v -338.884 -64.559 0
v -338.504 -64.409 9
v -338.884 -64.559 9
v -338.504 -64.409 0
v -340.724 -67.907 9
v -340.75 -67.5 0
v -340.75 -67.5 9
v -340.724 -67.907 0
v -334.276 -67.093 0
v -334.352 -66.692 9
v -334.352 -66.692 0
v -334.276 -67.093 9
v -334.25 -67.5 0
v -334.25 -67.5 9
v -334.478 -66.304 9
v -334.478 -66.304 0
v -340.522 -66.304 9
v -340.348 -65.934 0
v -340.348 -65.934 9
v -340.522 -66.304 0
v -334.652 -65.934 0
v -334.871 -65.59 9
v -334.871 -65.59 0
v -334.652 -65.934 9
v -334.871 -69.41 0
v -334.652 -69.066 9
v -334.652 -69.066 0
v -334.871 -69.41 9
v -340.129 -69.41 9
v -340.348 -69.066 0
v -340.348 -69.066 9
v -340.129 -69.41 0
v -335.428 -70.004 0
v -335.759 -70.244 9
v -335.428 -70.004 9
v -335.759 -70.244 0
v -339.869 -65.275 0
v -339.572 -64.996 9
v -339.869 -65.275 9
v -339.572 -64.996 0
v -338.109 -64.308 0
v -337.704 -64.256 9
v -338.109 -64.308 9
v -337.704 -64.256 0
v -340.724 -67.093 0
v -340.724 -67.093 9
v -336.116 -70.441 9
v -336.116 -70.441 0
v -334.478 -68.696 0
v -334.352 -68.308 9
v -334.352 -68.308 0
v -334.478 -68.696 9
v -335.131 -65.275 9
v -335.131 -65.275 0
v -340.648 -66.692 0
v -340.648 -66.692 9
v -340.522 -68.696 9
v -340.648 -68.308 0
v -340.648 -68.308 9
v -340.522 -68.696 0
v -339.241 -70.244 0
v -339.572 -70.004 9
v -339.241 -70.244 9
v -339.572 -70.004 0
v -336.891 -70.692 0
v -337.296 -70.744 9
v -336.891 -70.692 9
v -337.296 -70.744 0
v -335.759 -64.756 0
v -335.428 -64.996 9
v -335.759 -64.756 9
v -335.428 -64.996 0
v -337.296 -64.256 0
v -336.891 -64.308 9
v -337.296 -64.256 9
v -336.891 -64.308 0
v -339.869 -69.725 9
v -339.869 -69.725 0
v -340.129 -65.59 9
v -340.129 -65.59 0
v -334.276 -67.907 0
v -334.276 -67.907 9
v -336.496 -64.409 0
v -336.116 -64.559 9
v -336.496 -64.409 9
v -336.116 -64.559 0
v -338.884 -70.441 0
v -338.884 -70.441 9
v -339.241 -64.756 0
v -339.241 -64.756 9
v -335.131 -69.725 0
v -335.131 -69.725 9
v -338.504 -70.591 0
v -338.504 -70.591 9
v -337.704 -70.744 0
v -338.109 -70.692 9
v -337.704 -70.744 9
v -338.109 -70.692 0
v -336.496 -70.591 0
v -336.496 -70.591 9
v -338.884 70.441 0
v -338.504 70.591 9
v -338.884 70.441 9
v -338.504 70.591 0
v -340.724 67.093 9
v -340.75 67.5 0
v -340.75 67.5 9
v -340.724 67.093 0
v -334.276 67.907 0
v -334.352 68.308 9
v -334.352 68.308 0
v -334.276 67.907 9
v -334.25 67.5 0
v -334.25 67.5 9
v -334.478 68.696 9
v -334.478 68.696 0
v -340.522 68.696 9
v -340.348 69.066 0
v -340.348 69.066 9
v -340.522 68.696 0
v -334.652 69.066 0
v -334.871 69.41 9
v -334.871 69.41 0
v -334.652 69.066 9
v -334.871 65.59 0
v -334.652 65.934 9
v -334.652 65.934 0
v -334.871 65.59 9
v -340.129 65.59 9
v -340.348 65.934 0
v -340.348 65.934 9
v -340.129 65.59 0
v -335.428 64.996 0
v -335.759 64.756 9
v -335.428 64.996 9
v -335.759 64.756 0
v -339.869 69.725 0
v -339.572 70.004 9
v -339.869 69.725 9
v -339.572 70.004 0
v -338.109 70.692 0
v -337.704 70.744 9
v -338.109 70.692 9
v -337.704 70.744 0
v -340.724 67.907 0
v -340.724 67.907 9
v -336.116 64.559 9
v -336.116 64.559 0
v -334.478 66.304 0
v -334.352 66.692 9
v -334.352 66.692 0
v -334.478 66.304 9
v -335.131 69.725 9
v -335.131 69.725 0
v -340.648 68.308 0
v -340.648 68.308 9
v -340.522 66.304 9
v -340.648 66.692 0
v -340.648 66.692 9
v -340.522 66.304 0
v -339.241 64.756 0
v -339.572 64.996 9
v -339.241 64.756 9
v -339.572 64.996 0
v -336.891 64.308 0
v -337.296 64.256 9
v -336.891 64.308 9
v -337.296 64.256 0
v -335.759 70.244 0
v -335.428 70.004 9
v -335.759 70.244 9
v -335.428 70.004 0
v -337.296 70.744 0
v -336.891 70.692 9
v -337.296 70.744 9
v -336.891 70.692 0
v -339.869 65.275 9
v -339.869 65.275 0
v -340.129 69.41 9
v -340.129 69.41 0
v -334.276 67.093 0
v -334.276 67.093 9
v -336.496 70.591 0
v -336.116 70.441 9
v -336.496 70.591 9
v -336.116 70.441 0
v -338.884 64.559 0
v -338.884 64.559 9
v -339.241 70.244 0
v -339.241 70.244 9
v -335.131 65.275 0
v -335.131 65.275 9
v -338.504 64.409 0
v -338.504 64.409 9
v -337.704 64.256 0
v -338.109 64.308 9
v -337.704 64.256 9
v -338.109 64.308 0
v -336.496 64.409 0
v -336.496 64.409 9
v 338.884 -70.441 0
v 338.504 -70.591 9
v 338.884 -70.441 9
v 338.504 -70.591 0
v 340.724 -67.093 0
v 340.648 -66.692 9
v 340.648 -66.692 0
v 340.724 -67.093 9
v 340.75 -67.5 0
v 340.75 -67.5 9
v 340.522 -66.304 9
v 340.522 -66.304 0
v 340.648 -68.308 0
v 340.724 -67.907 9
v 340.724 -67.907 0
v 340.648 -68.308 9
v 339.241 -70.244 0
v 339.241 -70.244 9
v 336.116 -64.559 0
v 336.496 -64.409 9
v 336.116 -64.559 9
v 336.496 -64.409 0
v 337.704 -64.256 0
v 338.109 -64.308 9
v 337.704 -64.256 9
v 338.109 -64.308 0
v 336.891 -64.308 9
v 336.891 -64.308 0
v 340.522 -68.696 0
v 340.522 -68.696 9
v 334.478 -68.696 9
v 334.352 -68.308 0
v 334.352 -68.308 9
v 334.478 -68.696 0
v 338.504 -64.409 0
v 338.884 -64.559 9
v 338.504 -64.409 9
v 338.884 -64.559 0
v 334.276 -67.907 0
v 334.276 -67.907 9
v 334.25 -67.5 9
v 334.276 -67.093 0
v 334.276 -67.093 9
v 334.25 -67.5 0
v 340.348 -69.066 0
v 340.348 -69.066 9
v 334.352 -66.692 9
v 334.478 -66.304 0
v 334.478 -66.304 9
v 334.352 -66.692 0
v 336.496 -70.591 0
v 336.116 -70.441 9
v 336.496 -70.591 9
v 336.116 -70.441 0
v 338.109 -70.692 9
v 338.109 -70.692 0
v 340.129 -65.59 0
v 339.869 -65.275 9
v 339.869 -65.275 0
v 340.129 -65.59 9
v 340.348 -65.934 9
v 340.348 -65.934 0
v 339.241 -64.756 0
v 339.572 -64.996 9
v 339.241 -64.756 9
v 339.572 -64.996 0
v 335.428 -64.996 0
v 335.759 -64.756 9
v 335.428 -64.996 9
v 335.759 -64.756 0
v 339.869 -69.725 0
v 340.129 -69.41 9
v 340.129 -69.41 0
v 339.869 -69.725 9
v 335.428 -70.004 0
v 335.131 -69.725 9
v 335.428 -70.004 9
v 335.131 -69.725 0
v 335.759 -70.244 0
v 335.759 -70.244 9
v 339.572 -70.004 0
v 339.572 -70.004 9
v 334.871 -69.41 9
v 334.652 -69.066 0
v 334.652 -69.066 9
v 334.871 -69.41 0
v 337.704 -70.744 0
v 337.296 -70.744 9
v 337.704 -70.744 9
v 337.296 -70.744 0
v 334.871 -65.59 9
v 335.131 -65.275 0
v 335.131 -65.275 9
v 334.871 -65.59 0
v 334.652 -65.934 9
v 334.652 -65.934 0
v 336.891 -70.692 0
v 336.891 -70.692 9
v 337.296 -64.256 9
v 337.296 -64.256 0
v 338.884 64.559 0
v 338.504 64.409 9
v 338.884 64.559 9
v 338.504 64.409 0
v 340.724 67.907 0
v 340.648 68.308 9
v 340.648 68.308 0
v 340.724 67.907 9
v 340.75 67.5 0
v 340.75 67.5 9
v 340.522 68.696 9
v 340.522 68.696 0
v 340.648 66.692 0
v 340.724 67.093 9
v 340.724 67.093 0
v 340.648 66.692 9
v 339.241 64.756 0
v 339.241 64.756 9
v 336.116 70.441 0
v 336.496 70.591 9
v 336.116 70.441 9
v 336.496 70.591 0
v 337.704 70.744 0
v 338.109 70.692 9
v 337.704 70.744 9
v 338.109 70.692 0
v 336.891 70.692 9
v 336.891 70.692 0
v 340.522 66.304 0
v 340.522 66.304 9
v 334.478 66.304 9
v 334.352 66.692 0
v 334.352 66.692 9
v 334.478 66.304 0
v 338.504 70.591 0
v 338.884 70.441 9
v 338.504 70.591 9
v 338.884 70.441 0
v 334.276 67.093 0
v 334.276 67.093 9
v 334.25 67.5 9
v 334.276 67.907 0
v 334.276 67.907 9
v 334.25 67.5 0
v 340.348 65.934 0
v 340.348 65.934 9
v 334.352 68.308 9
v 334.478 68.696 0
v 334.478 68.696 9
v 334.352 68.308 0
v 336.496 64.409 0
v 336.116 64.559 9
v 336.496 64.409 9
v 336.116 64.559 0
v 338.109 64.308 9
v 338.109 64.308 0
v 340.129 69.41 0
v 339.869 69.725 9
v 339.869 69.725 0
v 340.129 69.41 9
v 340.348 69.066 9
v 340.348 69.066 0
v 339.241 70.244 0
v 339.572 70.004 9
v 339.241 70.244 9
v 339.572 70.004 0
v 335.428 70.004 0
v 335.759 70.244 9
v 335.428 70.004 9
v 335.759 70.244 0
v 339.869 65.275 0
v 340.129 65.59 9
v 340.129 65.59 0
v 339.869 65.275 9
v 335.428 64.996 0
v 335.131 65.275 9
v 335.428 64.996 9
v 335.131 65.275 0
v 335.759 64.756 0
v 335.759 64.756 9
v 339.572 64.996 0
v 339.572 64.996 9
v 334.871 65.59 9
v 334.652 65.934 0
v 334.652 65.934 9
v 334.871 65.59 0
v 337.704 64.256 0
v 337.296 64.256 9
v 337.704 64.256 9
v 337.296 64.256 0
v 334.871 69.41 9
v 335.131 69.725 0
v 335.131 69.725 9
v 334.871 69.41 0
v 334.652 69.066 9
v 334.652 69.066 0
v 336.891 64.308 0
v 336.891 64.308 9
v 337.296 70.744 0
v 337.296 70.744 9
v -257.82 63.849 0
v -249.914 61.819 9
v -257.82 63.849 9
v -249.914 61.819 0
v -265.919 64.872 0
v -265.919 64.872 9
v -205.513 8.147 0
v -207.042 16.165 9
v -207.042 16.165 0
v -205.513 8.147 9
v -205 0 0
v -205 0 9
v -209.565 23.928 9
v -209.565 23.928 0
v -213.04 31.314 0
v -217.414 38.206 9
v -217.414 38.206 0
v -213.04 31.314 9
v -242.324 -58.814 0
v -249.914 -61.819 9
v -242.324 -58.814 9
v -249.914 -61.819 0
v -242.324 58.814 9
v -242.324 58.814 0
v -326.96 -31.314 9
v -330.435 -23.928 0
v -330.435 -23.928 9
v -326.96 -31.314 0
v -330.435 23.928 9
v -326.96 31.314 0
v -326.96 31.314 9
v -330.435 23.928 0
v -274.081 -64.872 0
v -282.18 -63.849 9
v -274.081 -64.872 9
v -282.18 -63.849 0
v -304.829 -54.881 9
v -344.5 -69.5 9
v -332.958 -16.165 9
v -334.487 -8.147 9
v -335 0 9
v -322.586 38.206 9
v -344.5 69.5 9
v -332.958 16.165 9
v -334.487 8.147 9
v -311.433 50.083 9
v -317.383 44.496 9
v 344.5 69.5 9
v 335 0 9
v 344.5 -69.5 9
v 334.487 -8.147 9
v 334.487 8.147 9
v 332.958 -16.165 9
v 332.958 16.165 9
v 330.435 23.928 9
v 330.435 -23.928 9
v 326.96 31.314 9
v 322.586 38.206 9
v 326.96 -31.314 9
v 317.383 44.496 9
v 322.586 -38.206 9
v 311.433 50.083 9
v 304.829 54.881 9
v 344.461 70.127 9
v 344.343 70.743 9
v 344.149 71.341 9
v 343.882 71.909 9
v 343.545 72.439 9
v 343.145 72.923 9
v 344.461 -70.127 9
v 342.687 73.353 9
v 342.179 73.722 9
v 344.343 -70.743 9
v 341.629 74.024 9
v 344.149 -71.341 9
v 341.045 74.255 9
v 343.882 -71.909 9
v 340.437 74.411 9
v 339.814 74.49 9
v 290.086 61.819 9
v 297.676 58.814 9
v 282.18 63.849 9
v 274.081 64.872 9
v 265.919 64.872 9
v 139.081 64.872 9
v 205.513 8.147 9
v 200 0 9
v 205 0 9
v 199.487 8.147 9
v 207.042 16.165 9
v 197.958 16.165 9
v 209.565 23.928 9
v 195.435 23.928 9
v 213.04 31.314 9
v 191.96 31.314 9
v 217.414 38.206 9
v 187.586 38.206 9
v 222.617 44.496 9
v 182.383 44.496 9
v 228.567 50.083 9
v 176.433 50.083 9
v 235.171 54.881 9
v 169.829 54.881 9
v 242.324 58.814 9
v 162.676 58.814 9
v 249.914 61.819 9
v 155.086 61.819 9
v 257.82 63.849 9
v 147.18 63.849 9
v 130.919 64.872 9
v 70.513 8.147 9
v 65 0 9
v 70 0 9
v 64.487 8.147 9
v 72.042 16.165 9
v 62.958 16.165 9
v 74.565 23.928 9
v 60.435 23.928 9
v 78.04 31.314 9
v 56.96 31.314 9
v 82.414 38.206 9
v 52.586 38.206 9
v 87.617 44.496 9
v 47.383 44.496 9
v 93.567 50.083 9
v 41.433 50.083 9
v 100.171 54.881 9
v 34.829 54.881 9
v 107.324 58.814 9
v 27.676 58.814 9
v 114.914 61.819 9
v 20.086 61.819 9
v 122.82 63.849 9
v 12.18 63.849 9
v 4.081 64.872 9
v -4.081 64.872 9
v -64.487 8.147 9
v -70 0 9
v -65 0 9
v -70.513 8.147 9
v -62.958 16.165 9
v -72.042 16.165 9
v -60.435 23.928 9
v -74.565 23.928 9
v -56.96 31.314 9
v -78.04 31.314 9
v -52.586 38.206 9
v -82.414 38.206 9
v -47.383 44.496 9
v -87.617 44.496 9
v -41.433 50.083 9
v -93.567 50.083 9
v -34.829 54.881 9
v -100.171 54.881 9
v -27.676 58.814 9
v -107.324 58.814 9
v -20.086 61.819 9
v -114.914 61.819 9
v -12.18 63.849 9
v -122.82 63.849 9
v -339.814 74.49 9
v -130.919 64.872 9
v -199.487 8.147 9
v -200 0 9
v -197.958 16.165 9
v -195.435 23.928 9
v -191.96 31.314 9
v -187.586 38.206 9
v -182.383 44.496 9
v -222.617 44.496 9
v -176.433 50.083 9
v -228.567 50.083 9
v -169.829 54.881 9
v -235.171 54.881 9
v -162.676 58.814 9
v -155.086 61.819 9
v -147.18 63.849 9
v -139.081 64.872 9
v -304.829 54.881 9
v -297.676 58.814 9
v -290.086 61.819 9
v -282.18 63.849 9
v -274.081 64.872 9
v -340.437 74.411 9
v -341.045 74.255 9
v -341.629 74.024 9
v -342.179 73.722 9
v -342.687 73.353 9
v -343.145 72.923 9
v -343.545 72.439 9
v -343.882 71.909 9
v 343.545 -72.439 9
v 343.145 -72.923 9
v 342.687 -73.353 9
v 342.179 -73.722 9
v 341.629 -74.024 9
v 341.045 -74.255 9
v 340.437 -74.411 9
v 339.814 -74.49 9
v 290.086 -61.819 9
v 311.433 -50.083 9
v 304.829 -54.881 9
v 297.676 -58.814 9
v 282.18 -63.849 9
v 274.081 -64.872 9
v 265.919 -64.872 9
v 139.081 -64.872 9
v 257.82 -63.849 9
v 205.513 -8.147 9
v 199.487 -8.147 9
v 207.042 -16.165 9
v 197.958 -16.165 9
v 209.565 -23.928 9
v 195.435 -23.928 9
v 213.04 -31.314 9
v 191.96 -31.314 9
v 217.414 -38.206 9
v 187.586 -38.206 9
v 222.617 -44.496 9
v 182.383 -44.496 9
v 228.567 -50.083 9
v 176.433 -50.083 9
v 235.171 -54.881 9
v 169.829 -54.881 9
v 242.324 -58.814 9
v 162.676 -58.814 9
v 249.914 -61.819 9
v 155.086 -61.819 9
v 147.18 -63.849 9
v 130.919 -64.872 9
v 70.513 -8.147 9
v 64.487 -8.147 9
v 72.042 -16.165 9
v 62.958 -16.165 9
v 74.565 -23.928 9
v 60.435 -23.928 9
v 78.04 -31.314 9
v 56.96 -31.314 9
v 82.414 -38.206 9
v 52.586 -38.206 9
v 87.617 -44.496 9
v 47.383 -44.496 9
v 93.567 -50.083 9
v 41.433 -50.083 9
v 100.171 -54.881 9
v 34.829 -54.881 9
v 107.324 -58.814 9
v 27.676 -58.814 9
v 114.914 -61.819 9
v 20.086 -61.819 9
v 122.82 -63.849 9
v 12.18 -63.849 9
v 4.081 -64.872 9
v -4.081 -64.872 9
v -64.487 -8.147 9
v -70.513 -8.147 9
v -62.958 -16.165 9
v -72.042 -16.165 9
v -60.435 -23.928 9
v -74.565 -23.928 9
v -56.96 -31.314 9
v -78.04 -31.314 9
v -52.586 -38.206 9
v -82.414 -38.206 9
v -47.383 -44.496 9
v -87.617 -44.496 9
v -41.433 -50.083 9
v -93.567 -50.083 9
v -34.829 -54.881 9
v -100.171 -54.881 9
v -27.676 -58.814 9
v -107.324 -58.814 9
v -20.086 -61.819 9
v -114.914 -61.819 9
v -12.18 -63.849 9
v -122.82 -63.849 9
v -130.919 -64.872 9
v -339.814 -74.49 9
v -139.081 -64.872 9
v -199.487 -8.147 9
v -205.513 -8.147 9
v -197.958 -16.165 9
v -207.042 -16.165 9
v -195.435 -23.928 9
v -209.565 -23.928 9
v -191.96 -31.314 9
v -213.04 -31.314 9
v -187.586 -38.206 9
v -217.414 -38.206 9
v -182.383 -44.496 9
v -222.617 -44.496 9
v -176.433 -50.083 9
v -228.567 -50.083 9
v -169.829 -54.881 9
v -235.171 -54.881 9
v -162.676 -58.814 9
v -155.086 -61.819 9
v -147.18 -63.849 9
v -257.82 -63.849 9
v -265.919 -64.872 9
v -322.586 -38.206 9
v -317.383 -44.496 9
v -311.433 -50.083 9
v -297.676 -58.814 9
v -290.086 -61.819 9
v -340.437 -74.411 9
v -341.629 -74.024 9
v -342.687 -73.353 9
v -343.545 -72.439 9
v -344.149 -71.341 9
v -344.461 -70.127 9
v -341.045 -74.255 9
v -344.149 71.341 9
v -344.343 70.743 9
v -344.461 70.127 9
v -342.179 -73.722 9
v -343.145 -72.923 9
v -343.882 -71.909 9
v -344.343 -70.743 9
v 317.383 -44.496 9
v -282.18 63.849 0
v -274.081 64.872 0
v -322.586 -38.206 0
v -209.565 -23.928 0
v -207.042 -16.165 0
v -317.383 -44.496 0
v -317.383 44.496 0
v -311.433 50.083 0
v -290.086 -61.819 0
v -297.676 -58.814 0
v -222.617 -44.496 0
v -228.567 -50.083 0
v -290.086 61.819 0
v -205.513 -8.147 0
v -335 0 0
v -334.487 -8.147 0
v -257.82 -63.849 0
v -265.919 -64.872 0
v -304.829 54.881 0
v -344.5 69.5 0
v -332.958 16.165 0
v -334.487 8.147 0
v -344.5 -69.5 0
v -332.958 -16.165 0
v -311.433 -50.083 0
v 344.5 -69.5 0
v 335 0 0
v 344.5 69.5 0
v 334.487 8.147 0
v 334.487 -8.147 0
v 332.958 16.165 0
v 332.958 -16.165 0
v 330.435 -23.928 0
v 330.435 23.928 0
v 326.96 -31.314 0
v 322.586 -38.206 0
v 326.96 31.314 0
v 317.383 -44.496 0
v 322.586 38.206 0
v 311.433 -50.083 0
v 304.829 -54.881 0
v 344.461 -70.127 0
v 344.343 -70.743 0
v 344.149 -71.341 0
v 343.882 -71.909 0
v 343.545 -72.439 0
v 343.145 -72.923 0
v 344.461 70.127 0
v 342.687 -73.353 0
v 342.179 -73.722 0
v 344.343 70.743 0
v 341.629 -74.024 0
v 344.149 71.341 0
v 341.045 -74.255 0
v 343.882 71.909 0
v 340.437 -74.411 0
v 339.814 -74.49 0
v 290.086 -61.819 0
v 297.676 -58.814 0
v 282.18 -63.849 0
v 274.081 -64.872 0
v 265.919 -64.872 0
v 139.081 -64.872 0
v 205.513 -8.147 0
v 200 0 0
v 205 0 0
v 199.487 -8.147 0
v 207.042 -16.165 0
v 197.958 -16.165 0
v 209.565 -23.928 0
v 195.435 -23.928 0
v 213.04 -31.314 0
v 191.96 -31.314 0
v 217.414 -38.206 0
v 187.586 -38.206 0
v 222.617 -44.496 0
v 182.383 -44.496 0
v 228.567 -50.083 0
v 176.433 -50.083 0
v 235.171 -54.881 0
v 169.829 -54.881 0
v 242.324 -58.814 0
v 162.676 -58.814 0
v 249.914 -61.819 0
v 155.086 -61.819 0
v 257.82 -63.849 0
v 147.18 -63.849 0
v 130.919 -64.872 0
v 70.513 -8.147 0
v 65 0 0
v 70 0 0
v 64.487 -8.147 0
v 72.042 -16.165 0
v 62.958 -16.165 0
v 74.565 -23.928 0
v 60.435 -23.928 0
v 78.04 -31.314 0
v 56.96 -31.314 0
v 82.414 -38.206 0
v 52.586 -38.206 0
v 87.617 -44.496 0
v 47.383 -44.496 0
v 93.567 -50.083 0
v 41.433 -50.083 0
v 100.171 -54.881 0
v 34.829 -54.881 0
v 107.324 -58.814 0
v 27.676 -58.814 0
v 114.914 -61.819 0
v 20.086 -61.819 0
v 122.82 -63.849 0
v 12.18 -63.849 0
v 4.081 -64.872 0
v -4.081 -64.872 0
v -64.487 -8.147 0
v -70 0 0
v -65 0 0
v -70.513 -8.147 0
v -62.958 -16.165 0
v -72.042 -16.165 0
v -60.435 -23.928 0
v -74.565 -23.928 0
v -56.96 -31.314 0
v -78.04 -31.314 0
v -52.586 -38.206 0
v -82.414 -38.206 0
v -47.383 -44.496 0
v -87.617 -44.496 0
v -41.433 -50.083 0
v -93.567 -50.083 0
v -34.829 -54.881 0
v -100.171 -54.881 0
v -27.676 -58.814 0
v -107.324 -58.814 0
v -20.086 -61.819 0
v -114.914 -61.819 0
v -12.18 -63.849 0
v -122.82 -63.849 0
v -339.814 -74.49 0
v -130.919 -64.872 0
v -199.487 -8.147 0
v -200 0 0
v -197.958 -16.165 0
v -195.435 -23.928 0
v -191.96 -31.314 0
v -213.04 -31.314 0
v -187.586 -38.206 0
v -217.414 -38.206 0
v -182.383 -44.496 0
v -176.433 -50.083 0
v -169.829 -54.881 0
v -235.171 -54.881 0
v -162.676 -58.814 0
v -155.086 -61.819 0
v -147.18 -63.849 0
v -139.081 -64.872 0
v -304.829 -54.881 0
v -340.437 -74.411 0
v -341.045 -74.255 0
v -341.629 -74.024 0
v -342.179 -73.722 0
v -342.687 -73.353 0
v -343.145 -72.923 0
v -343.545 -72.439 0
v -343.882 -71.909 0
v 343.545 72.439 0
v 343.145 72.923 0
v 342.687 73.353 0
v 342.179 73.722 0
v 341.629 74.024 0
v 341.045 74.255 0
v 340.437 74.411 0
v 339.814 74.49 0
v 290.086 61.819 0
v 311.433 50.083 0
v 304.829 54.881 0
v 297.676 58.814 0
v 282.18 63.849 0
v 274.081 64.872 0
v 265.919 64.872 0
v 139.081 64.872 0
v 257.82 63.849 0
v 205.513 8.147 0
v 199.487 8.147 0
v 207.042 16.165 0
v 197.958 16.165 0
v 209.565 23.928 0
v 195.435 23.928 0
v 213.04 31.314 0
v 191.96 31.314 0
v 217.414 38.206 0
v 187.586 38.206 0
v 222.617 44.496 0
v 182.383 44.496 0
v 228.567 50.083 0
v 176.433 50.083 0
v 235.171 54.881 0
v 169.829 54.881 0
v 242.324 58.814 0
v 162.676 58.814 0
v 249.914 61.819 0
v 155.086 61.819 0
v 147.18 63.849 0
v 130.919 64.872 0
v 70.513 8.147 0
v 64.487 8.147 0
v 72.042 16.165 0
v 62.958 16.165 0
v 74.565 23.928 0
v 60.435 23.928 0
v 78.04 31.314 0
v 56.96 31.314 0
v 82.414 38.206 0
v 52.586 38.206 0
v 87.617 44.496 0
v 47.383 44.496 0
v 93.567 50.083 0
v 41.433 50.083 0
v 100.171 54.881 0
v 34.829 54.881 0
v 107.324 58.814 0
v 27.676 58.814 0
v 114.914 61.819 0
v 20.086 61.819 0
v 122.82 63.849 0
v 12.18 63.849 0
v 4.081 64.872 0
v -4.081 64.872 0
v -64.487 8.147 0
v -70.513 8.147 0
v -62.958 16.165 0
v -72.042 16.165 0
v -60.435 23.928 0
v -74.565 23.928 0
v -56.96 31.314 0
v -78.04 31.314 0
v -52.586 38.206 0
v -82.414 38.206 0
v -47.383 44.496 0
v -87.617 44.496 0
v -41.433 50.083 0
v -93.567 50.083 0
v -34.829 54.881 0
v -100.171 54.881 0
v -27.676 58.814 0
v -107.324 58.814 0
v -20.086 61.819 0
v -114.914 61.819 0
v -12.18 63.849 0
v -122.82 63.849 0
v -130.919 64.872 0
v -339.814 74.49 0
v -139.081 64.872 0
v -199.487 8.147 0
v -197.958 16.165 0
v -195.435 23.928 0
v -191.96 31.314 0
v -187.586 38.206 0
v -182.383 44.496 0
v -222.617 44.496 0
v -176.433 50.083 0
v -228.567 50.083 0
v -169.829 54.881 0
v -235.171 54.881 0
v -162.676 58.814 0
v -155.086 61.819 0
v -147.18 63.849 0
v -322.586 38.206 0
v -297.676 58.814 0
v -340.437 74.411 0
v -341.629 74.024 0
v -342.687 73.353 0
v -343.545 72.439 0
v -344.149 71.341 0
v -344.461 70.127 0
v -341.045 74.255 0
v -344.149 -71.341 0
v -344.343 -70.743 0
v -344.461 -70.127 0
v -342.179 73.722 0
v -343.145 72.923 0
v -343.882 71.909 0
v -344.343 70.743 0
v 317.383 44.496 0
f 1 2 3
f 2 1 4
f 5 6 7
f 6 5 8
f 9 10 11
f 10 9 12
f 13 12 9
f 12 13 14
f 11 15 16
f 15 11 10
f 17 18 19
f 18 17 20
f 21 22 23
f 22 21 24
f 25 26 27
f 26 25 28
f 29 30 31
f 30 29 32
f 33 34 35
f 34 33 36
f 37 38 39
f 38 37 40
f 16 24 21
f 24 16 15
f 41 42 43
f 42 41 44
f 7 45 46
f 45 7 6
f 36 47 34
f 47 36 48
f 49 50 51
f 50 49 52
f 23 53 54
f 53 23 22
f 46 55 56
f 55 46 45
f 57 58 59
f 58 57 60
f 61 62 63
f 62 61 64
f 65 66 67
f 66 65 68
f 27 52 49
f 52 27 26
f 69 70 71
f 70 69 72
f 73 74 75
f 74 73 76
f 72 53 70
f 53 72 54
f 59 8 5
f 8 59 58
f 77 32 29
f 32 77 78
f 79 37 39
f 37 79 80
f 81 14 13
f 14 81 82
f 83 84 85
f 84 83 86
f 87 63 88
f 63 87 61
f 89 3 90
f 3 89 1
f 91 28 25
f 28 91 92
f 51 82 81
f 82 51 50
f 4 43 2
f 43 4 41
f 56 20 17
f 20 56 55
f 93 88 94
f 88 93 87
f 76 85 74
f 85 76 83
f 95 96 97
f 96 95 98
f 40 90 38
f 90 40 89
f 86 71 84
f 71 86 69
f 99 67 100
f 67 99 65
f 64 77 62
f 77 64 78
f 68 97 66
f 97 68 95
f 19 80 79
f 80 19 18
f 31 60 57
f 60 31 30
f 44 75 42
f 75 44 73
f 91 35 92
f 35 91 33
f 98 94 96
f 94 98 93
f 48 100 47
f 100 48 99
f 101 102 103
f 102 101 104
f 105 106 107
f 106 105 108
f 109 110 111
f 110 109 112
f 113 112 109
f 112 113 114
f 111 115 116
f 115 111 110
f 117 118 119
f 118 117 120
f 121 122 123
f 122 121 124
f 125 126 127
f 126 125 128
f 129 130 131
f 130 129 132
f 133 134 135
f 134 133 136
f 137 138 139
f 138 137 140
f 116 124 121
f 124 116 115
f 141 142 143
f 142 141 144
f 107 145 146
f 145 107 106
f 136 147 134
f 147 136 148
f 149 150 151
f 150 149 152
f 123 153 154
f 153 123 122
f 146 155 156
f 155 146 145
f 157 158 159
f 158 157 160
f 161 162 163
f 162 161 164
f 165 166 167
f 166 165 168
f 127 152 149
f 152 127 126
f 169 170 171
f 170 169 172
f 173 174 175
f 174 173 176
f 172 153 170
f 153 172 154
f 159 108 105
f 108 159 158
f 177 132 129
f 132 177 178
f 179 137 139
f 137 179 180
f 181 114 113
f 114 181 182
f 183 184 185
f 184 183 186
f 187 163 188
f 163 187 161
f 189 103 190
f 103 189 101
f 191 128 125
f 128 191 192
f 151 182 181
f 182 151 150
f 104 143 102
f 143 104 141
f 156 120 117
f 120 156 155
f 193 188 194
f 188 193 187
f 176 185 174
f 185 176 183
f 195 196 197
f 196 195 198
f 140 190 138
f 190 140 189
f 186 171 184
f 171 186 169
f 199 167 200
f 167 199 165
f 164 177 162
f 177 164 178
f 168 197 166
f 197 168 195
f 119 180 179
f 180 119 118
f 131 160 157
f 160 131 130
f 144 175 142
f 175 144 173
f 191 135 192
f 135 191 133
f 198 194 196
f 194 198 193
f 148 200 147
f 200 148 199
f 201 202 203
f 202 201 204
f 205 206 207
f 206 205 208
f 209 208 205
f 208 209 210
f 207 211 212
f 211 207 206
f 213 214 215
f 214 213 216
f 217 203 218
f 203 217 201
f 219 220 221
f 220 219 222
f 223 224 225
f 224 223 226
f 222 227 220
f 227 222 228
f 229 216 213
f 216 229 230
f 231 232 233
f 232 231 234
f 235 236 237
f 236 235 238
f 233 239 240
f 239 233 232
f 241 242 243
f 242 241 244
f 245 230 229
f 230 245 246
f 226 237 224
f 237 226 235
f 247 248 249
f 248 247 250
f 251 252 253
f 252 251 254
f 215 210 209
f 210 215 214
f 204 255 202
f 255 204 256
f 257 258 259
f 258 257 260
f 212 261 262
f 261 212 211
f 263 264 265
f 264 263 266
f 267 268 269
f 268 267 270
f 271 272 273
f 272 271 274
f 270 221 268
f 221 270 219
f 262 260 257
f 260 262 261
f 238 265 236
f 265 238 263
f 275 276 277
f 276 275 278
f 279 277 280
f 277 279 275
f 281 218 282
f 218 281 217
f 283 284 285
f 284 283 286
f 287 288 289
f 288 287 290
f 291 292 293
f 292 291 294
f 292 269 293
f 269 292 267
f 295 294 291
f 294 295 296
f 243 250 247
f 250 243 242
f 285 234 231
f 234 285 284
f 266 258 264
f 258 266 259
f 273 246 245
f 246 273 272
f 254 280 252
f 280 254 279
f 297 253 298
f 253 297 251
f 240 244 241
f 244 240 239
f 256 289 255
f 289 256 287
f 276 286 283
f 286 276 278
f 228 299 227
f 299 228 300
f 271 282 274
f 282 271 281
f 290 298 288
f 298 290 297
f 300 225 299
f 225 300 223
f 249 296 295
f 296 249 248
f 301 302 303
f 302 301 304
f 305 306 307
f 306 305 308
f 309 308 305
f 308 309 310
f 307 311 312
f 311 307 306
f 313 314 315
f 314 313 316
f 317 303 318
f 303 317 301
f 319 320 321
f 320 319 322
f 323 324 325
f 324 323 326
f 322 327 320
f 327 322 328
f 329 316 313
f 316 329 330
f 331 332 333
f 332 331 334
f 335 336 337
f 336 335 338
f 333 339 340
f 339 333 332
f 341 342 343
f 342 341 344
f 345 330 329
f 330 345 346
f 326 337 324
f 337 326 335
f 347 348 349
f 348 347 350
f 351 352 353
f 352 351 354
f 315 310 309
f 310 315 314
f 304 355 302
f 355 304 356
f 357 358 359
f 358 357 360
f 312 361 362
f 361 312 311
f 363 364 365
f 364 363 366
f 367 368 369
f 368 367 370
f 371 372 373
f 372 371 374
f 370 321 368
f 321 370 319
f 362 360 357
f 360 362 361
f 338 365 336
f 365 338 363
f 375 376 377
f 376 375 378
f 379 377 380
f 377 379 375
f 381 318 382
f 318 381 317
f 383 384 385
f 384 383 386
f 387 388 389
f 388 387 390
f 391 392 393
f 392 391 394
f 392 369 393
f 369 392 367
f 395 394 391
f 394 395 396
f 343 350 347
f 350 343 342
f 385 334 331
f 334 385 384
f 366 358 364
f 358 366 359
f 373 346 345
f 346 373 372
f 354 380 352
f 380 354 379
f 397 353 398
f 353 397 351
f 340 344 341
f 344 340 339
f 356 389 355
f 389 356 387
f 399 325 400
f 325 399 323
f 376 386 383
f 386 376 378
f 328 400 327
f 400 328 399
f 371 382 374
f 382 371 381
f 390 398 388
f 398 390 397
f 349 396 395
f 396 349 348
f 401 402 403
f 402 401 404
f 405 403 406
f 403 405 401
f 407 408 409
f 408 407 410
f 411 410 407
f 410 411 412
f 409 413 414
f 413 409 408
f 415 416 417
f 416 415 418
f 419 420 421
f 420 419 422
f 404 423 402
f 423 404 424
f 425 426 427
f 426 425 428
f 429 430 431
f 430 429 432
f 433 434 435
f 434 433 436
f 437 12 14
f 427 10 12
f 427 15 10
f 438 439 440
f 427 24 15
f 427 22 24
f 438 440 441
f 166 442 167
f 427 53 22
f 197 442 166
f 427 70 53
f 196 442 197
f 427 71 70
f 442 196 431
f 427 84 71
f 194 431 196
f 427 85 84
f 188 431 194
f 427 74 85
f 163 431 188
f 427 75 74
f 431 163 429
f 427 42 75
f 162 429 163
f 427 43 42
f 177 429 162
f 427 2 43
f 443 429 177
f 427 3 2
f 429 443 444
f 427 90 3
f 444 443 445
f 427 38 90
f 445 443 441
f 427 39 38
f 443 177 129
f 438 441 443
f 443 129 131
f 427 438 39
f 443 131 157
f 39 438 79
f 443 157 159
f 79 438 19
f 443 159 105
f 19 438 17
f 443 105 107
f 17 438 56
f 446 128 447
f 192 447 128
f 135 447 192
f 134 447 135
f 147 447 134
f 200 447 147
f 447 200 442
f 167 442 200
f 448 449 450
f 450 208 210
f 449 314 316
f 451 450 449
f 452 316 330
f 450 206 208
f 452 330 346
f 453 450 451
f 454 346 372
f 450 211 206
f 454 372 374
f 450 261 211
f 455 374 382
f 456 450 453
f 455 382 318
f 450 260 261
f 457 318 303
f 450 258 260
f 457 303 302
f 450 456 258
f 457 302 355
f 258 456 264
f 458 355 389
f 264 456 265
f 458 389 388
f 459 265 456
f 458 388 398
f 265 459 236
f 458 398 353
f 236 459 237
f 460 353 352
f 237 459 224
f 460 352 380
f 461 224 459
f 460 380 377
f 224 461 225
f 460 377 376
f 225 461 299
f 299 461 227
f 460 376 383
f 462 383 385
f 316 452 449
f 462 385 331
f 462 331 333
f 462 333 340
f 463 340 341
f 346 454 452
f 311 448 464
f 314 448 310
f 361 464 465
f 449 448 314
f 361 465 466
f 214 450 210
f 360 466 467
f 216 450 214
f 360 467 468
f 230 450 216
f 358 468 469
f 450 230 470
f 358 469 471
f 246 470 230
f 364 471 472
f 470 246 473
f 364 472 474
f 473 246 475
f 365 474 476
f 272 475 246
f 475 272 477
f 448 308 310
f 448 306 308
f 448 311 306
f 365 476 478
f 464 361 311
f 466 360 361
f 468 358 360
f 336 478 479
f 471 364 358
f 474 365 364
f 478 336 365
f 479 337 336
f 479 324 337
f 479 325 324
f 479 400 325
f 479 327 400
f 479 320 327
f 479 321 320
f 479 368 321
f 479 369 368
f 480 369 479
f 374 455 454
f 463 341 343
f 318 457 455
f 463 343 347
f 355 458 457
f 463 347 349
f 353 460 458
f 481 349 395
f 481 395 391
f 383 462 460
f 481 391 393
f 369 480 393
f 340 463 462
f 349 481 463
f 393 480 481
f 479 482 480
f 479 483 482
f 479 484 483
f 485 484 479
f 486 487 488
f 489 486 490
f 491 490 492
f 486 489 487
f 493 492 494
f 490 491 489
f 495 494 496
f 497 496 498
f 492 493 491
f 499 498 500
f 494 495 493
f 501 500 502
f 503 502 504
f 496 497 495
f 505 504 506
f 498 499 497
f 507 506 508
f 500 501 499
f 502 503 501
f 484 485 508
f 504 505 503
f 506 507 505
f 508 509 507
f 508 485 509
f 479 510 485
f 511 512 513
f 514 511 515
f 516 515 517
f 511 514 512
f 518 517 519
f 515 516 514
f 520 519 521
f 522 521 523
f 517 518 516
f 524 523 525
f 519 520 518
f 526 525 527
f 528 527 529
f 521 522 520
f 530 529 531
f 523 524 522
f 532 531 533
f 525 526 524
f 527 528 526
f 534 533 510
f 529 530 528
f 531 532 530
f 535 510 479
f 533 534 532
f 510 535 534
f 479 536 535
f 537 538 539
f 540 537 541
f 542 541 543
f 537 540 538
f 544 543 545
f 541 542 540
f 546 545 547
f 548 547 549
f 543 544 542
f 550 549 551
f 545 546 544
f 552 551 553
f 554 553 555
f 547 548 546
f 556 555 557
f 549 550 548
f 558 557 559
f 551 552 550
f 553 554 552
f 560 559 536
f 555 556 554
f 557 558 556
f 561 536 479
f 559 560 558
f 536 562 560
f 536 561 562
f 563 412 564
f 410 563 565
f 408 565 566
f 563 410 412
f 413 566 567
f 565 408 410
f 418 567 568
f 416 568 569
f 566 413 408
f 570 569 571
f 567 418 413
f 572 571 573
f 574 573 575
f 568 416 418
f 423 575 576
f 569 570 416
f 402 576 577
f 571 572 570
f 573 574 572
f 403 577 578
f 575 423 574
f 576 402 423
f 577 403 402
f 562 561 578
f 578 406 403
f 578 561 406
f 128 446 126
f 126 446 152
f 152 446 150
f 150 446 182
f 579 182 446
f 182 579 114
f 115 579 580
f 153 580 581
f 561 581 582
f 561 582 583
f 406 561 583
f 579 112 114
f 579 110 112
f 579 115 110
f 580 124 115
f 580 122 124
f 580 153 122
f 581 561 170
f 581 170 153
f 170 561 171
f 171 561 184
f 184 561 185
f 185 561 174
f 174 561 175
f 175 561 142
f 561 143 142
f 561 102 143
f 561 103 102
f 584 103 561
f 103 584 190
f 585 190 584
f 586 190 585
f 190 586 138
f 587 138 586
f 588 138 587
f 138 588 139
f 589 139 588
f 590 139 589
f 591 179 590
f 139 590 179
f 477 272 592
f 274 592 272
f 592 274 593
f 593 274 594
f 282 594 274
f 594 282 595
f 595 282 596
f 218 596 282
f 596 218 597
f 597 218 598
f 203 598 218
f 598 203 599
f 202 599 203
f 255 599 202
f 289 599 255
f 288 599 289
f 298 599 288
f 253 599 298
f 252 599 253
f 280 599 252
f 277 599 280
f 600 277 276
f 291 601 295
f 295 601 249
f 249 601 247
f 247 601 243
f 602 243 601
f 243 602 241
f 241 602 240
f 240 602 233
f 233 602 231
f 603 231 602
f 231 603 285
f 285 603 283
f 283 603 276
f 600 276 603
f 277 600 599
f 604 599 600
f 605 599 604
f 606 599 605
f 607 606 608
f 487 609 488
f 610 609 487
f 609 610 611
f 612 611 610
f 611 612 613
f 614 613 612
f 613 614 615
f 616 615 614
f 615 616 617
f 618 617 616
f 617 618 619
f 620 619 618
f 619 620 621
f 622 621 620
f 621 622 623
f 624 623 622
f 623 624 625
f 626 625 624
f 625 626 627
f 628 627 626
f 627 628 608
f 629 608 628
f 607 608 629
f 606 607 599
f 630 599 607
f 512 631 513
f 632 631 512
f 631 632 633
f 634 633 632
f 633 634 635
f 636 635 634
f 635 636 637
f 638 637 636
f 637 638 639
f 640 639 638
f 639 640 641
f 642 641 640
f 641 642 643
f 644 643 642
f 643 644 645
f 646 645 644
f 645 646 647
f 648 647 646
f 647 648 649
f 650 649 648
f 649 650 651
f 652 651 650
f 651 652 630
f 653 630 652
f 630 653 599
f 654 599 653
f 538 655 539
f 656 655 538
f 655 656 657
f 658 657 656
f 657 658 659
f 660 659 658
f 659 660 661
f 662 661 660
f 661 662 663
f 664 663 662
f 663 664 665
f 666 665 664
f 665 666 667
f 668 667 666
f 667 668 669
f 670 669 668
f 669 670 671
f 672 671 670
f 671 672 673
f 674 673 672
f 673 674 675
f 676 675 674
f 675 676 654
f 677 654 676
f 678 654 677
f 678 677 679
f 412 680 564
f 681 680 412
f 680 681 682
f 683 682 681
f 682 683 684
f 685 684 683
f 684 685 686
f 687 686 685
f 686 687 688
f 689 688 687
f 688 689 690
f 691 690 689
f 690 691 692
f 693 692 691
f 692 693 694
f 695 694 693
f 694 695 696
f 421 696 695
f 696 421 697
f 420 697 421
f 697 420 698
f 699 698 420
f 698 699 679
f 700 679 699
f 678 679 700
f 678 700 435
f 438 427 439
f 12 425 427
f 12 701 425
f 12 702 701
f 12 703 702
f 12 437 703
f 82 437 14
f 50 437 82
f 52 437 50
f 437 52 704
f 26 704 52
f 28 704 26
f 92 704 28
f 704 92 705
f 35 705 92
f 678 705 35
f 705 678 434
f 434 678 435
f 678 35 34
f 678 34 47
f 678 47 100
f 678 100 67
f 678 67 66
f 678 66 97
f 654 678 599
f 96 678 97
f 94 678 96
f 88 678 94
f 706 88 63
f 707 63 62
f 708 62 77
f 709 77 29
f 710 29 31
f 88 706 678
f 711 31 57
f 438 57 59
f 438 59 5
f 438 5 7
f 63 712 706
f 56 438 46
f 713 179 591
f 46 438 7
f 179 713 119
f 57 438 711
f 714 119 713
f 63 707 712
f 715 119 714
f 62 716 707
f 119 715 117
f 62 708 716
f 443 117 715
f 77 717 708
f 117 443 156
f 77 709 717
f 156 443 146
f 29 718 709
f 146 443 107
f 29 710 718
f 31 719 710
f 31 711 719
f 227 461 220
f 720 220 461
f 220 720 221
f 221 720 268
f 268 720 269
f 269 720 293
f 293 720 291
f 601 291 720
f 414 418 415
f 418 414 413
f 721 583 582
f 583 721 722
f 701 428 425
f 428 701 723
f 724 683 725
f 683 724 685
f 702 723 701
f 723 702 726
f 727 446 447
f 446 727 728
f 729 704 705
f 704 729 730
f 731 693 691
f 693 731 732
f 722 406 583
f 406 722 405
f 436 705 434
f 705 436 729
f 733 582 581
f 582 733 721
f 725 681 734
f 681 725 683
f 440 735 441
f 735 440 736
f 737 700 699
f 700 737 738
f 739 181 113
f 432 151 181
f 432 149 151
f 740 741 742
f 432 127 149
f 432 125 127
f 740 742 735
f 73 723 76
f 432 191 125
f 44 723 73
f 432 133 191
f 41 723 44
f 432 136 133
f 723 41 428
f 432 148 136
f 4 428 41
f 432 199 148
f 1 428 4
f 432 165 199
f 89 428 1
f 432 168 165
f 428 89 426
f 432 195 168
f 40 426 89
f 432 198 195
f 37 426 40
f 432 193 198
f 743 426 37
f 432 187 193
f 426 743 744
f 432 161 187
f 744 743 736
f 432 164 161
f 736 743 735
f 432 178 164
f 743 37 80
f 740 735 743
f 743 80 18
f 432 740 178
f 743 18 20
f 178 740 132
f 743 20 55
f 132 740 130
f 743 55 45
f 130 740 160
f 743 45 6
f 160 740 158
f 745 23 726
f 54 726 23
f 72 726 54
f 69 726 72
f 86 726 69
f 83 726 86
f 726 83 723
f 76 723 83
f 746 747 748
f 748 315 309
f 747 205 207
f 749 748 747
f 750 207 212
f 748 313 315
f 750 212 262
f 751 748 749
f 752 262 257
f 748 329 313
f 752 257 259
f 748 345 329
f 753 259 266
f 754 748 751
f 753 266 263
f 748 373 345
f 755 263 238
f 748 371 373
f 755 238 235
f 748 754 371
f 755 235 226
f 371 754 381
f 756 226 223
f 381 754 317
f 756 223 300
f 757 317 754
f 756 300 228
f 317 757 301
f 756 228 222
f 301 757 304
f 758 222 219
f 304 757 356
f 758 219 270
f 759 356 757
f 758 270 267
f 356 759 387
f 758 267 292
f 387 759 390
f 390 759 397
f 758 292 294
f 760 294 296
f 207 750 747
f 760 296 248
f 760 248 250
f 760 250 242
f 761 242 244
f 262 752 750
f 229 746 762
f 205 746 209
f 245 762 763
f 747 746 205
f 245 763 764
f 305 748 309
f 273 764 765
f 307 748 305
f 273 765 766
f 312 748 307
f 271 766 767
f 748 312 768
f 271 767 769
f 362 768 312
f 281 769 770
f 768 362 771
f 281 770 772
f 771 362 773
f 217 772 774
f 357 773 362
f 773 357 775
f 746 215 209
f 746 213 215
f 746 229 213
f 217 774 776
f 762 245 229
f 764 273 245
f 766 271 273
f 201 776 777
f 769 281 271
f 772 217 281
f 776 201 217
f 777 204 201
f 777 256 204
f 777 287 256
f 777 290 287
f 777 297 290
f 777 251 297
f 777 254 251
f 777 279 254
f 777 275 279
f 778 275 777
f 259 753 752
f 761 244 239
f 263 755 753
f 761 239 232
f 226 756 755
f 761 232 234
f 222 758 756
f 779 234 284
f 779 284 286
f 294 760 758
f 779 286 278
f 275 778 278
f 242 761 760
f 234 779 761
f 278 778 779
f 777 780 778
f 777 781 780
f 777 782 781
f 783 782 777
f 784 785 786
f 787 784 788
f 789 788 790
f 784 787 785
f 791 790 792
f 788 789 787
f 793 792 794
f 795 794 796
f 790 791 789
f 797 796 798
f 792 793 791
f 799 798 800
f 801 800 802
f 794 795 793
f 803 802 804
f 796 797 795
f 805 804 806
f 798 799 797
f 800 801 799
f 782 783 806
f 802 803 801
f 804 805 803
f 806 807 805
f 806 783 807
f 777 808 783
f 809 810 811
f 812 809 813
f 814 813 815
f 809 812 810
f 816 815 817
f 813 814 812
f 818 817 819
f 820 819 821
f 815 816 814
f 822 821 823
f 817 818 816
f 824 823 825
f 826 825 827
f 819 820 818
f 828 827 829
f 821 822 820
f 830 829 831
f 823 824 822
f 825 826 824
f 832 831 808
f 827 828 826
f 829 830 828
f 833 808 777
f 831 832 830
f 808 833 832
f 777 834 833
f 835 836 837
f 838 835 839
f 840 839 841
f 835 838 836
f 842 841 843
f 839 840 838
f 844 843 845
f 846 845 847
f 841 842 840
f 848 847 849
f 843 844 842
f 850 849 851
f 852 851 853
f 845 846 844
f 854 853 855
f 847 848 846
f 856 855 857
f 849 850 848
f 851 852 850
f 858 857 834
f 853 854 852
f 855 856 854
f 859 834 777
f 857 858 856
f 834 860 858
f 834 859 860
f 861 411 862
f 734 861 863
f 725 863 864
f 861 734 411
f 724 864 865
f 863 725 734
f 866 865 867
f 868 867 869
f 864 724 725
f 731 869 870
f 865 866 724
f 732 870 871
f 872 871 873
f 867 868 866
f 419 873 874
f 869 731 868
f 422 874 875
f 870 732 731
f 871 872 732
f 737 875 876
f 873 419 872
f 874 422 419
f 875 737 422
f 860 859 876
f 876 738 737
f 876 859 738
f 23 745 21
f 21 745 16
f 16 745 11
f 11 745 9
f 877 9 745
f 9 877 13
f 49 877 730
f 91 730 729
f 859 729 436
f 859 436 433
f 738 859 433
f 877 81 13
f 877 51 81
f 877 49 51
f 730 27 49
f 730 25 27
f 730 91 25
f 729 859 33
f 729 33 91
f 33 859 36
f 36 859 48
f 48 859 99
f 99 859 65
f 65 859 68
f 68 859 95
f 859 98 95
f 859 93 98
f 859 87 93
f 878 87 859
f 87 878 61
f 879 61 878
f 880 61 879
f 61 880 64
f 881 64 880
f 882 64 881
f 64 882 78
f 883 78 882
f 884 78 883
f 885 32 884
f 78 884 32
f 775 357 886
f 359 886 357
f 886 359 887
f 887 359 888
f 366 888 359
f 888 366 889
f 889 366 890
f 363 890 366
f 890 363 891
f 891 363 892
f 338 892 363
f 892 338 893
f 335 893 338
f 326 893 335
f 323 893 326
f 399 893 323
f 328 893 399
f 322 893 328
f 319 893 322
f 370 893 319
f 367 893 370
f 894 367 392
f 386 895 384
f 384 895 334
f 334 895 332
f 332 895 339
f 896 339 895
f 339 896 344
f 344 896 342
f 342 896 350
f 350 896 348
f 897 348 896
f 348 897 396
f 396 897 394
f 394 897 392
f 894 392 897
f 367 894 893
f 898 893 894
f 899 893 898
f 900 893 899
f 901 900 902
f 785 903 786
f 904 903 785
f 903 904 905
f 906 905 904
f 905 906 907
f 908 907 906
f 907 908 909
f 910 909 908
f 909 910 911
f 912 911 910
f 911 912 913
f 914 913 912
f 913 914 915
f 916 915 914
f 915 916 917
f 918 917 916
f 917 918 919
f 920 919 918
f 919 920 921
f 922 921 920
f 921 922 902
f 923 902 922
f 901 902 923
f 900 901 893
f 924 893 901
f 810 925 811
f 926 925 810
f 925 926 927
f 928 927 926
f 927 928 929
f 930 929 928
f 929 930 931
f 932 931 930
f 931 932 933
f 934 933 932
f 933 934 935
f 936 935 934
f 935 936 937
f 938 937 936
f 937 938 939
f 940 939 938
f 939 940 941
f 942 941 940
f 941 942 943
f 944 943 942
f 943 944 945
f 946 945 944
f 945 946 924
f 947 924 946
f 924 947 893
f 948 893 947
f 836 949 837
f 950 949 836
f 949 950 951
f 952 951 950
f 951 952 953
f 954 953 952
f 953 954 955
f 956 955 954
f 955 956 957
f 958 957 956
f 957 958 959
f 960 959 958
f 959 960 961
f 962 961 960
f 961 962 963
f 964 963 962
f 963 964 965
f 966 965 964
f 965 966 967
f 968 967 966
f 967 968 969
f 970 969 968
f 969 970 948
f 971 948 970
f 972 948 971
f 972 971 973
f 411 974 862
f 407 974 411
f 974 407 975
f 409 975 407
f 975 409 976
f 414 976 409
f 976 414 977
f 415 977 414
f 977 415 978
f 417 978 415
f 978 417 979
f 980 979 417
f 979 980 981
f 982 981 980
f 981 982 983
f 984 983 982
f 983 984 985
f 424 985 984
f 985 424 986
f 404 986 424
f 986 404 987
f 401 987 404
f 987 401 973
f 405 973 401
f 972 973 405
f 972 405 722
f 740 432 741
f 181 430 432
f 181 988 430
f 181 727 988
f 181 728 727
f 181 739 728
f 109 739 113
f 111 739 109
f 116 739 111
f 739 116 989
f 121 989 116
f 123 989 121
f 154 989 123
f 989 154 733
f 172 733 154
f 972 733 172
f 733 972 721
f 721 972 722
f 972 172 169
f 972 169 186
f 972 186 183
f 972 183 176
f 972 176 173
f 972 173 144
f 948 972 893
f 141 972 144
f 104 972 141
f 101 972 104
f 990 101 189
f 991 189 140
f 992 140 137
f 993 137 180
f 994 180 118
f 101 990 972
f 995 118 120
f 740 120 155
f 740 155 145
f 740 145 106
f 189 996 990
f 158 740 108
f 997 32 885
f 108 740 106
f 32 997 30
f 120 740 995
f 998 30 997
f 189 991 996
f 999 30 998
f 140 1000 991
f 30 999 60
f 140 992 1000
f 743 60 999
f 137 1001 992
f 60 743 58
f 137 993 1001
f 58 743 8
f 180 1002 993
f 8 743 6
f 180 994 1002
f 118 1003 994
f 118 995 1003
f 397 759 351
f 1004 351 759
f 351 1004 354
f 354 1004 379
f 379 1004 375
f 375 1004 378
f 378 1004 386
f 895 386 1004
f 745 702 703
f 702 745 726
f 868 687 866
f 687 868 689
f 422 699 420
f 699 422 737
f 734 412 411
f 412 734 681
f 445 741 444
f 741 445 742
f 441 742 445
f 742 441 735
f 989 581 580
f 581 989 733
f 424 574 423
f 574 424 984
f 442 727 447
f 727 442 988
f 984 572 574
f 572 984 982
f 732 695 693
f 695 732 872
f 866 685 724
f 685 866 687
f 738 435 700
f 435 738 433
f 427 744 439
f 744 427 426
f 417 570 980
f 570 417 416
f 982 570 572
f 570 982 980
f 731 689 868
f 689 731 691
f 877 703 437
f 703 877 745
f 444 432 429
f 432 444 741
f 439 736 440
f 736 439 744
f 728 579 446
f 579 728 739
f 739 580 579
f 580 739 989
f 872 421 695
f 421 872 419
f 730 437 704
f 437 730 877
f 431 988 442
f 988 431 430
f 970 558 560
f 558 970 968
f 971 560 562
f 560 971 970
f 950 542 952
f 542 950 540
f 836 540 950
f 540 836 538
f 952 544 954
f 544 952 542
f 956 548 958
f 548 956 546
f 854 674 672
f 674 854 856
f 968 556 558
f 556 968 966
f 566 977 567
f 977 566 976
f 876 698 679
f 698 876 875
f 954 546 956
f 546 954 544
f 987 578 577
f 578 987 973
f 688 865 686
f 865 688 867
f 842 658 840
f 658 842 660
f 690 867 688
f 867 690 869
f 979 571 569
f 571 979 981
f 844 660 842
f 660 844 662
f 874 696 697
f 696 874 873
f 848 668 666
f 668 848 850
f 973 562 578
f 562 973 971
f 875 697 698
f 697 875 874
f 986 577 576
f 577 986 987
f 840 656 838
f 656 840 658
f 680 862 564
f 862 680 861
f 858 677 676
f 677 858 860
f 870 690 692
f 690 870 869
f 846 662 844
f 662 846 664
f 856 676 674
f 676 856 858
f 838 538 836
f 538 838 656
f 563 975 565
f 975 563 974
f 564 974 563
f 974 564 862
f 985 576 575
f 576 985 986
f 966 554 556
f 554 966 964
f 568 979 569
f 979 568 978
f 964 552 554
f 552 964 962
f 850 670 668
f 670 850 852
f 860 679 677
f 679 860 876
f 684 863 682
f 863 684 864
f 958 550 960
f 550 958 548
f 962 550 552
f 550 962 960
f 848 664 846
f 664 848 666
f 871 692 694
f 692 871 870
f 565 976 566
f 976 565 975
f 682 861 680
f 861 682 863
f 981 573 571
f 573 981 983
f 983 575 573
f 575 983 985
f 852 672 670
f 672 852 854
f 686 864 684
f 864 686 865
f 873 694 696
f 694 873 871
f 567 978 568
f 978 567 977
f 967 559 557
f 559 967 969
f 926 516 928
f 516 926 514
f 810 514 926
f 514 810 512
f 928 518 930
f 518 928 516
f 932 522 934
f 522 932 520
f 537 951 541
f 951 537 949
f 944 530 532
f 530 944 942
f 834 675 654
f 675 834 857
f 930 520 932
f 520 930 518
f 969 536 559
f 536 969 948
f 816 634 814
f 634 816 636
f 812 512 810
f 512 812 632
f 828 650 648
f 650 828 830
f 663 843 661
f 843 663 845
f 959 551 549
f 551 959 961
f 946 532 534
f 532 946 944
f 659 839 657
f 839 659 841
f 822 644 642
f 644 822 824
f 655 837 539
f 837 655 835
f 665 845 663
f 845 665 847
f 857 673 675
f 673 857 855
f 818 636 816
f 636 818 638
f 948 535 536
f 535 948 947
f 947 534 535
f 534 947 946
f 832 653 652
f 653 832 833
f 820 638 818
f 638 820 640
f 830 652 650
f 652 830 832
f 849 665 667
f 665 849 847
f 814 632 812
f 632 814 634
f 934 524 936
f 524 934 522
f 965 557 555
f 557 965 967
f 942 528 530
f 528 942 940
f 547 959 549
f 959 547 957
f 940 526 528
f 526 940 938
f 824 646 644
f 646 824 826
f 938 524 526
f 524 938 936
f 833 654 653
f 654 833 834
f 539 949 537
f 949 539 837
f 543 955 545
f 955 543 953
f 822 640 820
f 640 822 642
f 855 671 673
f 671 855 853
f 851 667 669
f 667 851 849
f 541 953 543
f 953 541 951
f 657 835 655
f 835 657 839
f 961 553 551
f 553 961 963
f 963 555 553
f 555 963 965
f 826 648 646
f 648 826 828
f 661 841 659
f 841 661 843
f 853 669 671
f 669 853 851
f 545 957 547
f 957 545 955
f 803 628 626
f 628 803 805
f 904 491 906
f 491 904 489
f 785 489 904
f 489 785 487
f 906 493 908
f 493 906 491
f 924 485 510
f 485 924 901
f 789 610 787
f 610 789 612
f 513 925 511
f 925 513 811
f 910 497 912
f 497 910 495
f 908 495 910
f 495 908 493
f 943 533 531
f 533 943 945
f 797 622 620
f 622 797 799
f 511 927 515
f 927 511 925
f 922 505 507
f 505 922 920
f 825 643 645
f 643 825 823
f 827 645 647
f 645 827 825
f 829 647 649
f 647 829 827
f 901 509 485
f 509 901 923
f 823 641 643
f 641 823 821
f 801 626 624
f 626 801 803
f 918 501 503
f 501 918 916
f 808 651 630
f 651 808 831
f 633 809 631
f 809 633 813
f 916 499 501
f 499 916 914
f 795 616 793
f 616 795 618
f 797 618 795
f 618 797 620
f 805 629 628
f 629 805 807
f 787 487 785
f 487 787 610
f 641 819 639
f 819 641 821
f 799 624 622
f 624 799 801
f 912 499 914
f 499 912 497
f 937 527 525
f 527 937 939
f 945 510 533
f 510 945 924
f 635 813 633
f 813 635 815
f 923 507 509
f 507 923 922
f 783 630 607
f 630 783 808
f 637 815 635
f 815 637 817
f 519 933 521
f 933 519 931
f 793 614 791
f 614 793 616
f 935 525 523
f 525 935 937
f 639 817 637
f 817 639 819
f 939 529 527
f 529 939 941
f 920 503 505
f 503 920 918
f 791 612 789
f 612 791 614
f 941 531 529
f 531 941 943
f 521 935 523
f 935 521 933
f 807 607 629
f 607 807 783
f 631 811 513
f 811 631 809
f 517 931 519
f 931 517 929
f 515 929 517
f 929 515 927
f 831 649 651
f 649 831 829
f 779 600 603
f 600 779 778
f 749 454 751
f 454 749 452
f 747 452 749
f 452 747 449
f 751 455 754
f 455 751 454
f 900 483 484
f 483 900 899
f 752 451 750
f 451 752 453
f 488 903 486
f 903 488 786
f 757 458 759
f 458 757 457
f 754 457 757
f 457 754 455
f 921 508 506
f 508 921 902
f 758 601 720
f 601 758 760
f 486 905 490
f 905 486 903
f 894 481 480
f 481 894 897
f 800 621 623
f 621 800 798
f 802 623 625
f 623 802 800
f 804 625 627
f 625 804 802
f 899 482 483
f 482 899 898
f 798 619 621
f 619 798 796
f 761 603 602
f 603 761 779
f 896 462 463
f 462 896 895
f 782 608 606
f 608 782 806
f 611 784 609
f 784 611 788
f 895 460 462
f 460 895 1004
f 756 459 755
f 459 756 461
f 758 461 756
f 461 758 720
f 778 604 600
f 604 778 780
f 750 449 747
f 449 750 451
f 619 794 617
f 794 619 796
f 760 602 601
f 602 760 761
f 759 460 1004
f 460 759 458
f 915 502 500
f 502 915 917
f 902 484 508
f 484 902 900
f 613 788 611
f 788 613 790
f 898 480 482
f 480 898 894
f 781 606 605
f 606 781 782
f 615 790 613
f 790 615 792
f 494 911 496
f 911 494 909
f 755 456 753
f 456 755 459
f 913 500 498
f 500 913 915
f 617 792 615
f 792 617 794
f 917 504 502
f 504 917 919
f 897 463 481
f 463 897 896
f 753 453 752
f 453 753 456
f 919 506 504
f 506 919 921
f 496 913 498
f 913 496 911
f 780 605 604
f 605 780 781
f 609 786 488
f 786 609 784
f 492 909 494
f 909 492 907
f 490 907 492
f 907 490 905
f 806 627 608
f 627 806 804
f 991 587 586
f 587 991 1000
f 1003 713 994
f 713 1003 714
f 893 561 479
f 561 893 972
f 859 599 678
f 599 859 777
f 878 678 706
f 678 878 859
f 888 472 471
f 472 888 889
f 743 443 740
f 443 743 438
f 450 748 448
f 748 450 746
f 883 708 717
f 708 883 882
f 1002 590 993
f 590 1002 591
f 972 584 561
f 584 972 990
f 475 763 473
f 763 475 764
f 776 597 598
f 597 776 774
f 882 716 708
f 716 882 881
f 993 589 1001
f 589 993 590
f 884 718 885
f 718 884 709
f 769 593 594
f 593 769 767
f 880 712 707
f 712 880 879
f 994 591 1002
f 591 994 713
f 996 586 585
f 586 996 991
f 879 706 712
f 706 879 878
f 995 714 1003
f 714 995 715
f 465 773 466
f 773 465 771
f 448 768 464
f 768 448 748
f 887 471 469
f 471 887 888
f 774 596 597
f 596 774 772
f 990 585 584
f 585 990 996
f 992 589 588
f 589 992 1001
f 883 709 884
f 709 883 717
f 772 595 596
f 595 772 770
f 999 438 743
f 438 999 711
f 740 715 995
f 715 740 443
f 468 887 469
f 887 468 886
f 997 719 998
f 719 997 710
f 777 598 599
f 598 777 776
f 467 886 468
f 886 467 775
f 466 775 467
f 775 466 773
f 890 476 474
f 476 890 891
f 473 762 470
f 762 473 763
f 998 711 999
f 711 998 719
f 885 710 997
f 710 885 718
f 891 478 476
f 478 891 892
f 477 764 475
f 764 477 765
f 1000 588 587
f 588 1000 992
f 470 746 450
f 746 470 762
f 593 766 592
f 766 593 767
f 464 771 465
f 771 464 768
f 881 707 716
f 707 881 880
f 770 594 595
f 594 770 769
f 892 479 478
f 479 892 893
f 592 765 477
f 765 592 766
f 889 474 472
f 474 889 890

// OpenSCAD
$fn = 50;

difference() {
	union() {
		hull() {
			translate(v = [-339.5, 69.5, 0]) {
				cylinder(h = 9, r = 5);
			}
			translate(v = [339.5, 69.5, 0]) {
				cylinder(h = 9, r = 5);
			}
			translate(v = [-339.5, -69.5, 0]) {
				cylinder(h = 9, r = 5);
			}
			translate(v = [339.5, -69.5, 0]) {
				cylinder(h = 9, r = 5);
			}
		}
	}
	union() {
		translate(v = [-337.5, -67.5, -100.0]) {
			cylinder(h = 200, r = 3.25);
		}
		translate(v = [-337.5, 67.5, -100.0]) {
			cylinder(h = 200, r = 3.25);
		}
		translate(v = [337.5, -67.5, -100.0]) {
			cylinder(h = 200, r = 3.25);
		}
		translate(v = [337.5, 67.5, -100.0]) {
			cylinder(h = 200, r = 3.25);
		}
		translate(v = [-337.5, -67.5, -100.0]) {
			cylinder(h = 200, r = 1.8);
		}
		translate(v = [-337.5, 67.5, -100.0]) {
			cylinder(h = 200, r = 1.8);
		}
		translate(v = [337.5, -67.5, -100.0]) {
			cylinder(h = 200, r = 1.8);
		}
		translate(v = [337.5, 67.5, -100.0]) {
			cylinder(h = 200, r = 1.8);
		}
		translate(v = [-270.0, 0, 0.0]) {
			cylinder(h = 9, r = 65.0);
		}
		translate(v = [-135.0, 0, 0.0]) {
			cylinder(h = 9, r = 65.0);
		}
		cylinder(h = 9, r = 65.0);
		translate(v = [135.0, 0, 0.0]) {
			cylinder(h = 9, r = 65.0);
		}
		translate(v = [270.0, 0, 0.0]) {
			cylinder(h = 9, r = 65.0);
		}
	}
}
